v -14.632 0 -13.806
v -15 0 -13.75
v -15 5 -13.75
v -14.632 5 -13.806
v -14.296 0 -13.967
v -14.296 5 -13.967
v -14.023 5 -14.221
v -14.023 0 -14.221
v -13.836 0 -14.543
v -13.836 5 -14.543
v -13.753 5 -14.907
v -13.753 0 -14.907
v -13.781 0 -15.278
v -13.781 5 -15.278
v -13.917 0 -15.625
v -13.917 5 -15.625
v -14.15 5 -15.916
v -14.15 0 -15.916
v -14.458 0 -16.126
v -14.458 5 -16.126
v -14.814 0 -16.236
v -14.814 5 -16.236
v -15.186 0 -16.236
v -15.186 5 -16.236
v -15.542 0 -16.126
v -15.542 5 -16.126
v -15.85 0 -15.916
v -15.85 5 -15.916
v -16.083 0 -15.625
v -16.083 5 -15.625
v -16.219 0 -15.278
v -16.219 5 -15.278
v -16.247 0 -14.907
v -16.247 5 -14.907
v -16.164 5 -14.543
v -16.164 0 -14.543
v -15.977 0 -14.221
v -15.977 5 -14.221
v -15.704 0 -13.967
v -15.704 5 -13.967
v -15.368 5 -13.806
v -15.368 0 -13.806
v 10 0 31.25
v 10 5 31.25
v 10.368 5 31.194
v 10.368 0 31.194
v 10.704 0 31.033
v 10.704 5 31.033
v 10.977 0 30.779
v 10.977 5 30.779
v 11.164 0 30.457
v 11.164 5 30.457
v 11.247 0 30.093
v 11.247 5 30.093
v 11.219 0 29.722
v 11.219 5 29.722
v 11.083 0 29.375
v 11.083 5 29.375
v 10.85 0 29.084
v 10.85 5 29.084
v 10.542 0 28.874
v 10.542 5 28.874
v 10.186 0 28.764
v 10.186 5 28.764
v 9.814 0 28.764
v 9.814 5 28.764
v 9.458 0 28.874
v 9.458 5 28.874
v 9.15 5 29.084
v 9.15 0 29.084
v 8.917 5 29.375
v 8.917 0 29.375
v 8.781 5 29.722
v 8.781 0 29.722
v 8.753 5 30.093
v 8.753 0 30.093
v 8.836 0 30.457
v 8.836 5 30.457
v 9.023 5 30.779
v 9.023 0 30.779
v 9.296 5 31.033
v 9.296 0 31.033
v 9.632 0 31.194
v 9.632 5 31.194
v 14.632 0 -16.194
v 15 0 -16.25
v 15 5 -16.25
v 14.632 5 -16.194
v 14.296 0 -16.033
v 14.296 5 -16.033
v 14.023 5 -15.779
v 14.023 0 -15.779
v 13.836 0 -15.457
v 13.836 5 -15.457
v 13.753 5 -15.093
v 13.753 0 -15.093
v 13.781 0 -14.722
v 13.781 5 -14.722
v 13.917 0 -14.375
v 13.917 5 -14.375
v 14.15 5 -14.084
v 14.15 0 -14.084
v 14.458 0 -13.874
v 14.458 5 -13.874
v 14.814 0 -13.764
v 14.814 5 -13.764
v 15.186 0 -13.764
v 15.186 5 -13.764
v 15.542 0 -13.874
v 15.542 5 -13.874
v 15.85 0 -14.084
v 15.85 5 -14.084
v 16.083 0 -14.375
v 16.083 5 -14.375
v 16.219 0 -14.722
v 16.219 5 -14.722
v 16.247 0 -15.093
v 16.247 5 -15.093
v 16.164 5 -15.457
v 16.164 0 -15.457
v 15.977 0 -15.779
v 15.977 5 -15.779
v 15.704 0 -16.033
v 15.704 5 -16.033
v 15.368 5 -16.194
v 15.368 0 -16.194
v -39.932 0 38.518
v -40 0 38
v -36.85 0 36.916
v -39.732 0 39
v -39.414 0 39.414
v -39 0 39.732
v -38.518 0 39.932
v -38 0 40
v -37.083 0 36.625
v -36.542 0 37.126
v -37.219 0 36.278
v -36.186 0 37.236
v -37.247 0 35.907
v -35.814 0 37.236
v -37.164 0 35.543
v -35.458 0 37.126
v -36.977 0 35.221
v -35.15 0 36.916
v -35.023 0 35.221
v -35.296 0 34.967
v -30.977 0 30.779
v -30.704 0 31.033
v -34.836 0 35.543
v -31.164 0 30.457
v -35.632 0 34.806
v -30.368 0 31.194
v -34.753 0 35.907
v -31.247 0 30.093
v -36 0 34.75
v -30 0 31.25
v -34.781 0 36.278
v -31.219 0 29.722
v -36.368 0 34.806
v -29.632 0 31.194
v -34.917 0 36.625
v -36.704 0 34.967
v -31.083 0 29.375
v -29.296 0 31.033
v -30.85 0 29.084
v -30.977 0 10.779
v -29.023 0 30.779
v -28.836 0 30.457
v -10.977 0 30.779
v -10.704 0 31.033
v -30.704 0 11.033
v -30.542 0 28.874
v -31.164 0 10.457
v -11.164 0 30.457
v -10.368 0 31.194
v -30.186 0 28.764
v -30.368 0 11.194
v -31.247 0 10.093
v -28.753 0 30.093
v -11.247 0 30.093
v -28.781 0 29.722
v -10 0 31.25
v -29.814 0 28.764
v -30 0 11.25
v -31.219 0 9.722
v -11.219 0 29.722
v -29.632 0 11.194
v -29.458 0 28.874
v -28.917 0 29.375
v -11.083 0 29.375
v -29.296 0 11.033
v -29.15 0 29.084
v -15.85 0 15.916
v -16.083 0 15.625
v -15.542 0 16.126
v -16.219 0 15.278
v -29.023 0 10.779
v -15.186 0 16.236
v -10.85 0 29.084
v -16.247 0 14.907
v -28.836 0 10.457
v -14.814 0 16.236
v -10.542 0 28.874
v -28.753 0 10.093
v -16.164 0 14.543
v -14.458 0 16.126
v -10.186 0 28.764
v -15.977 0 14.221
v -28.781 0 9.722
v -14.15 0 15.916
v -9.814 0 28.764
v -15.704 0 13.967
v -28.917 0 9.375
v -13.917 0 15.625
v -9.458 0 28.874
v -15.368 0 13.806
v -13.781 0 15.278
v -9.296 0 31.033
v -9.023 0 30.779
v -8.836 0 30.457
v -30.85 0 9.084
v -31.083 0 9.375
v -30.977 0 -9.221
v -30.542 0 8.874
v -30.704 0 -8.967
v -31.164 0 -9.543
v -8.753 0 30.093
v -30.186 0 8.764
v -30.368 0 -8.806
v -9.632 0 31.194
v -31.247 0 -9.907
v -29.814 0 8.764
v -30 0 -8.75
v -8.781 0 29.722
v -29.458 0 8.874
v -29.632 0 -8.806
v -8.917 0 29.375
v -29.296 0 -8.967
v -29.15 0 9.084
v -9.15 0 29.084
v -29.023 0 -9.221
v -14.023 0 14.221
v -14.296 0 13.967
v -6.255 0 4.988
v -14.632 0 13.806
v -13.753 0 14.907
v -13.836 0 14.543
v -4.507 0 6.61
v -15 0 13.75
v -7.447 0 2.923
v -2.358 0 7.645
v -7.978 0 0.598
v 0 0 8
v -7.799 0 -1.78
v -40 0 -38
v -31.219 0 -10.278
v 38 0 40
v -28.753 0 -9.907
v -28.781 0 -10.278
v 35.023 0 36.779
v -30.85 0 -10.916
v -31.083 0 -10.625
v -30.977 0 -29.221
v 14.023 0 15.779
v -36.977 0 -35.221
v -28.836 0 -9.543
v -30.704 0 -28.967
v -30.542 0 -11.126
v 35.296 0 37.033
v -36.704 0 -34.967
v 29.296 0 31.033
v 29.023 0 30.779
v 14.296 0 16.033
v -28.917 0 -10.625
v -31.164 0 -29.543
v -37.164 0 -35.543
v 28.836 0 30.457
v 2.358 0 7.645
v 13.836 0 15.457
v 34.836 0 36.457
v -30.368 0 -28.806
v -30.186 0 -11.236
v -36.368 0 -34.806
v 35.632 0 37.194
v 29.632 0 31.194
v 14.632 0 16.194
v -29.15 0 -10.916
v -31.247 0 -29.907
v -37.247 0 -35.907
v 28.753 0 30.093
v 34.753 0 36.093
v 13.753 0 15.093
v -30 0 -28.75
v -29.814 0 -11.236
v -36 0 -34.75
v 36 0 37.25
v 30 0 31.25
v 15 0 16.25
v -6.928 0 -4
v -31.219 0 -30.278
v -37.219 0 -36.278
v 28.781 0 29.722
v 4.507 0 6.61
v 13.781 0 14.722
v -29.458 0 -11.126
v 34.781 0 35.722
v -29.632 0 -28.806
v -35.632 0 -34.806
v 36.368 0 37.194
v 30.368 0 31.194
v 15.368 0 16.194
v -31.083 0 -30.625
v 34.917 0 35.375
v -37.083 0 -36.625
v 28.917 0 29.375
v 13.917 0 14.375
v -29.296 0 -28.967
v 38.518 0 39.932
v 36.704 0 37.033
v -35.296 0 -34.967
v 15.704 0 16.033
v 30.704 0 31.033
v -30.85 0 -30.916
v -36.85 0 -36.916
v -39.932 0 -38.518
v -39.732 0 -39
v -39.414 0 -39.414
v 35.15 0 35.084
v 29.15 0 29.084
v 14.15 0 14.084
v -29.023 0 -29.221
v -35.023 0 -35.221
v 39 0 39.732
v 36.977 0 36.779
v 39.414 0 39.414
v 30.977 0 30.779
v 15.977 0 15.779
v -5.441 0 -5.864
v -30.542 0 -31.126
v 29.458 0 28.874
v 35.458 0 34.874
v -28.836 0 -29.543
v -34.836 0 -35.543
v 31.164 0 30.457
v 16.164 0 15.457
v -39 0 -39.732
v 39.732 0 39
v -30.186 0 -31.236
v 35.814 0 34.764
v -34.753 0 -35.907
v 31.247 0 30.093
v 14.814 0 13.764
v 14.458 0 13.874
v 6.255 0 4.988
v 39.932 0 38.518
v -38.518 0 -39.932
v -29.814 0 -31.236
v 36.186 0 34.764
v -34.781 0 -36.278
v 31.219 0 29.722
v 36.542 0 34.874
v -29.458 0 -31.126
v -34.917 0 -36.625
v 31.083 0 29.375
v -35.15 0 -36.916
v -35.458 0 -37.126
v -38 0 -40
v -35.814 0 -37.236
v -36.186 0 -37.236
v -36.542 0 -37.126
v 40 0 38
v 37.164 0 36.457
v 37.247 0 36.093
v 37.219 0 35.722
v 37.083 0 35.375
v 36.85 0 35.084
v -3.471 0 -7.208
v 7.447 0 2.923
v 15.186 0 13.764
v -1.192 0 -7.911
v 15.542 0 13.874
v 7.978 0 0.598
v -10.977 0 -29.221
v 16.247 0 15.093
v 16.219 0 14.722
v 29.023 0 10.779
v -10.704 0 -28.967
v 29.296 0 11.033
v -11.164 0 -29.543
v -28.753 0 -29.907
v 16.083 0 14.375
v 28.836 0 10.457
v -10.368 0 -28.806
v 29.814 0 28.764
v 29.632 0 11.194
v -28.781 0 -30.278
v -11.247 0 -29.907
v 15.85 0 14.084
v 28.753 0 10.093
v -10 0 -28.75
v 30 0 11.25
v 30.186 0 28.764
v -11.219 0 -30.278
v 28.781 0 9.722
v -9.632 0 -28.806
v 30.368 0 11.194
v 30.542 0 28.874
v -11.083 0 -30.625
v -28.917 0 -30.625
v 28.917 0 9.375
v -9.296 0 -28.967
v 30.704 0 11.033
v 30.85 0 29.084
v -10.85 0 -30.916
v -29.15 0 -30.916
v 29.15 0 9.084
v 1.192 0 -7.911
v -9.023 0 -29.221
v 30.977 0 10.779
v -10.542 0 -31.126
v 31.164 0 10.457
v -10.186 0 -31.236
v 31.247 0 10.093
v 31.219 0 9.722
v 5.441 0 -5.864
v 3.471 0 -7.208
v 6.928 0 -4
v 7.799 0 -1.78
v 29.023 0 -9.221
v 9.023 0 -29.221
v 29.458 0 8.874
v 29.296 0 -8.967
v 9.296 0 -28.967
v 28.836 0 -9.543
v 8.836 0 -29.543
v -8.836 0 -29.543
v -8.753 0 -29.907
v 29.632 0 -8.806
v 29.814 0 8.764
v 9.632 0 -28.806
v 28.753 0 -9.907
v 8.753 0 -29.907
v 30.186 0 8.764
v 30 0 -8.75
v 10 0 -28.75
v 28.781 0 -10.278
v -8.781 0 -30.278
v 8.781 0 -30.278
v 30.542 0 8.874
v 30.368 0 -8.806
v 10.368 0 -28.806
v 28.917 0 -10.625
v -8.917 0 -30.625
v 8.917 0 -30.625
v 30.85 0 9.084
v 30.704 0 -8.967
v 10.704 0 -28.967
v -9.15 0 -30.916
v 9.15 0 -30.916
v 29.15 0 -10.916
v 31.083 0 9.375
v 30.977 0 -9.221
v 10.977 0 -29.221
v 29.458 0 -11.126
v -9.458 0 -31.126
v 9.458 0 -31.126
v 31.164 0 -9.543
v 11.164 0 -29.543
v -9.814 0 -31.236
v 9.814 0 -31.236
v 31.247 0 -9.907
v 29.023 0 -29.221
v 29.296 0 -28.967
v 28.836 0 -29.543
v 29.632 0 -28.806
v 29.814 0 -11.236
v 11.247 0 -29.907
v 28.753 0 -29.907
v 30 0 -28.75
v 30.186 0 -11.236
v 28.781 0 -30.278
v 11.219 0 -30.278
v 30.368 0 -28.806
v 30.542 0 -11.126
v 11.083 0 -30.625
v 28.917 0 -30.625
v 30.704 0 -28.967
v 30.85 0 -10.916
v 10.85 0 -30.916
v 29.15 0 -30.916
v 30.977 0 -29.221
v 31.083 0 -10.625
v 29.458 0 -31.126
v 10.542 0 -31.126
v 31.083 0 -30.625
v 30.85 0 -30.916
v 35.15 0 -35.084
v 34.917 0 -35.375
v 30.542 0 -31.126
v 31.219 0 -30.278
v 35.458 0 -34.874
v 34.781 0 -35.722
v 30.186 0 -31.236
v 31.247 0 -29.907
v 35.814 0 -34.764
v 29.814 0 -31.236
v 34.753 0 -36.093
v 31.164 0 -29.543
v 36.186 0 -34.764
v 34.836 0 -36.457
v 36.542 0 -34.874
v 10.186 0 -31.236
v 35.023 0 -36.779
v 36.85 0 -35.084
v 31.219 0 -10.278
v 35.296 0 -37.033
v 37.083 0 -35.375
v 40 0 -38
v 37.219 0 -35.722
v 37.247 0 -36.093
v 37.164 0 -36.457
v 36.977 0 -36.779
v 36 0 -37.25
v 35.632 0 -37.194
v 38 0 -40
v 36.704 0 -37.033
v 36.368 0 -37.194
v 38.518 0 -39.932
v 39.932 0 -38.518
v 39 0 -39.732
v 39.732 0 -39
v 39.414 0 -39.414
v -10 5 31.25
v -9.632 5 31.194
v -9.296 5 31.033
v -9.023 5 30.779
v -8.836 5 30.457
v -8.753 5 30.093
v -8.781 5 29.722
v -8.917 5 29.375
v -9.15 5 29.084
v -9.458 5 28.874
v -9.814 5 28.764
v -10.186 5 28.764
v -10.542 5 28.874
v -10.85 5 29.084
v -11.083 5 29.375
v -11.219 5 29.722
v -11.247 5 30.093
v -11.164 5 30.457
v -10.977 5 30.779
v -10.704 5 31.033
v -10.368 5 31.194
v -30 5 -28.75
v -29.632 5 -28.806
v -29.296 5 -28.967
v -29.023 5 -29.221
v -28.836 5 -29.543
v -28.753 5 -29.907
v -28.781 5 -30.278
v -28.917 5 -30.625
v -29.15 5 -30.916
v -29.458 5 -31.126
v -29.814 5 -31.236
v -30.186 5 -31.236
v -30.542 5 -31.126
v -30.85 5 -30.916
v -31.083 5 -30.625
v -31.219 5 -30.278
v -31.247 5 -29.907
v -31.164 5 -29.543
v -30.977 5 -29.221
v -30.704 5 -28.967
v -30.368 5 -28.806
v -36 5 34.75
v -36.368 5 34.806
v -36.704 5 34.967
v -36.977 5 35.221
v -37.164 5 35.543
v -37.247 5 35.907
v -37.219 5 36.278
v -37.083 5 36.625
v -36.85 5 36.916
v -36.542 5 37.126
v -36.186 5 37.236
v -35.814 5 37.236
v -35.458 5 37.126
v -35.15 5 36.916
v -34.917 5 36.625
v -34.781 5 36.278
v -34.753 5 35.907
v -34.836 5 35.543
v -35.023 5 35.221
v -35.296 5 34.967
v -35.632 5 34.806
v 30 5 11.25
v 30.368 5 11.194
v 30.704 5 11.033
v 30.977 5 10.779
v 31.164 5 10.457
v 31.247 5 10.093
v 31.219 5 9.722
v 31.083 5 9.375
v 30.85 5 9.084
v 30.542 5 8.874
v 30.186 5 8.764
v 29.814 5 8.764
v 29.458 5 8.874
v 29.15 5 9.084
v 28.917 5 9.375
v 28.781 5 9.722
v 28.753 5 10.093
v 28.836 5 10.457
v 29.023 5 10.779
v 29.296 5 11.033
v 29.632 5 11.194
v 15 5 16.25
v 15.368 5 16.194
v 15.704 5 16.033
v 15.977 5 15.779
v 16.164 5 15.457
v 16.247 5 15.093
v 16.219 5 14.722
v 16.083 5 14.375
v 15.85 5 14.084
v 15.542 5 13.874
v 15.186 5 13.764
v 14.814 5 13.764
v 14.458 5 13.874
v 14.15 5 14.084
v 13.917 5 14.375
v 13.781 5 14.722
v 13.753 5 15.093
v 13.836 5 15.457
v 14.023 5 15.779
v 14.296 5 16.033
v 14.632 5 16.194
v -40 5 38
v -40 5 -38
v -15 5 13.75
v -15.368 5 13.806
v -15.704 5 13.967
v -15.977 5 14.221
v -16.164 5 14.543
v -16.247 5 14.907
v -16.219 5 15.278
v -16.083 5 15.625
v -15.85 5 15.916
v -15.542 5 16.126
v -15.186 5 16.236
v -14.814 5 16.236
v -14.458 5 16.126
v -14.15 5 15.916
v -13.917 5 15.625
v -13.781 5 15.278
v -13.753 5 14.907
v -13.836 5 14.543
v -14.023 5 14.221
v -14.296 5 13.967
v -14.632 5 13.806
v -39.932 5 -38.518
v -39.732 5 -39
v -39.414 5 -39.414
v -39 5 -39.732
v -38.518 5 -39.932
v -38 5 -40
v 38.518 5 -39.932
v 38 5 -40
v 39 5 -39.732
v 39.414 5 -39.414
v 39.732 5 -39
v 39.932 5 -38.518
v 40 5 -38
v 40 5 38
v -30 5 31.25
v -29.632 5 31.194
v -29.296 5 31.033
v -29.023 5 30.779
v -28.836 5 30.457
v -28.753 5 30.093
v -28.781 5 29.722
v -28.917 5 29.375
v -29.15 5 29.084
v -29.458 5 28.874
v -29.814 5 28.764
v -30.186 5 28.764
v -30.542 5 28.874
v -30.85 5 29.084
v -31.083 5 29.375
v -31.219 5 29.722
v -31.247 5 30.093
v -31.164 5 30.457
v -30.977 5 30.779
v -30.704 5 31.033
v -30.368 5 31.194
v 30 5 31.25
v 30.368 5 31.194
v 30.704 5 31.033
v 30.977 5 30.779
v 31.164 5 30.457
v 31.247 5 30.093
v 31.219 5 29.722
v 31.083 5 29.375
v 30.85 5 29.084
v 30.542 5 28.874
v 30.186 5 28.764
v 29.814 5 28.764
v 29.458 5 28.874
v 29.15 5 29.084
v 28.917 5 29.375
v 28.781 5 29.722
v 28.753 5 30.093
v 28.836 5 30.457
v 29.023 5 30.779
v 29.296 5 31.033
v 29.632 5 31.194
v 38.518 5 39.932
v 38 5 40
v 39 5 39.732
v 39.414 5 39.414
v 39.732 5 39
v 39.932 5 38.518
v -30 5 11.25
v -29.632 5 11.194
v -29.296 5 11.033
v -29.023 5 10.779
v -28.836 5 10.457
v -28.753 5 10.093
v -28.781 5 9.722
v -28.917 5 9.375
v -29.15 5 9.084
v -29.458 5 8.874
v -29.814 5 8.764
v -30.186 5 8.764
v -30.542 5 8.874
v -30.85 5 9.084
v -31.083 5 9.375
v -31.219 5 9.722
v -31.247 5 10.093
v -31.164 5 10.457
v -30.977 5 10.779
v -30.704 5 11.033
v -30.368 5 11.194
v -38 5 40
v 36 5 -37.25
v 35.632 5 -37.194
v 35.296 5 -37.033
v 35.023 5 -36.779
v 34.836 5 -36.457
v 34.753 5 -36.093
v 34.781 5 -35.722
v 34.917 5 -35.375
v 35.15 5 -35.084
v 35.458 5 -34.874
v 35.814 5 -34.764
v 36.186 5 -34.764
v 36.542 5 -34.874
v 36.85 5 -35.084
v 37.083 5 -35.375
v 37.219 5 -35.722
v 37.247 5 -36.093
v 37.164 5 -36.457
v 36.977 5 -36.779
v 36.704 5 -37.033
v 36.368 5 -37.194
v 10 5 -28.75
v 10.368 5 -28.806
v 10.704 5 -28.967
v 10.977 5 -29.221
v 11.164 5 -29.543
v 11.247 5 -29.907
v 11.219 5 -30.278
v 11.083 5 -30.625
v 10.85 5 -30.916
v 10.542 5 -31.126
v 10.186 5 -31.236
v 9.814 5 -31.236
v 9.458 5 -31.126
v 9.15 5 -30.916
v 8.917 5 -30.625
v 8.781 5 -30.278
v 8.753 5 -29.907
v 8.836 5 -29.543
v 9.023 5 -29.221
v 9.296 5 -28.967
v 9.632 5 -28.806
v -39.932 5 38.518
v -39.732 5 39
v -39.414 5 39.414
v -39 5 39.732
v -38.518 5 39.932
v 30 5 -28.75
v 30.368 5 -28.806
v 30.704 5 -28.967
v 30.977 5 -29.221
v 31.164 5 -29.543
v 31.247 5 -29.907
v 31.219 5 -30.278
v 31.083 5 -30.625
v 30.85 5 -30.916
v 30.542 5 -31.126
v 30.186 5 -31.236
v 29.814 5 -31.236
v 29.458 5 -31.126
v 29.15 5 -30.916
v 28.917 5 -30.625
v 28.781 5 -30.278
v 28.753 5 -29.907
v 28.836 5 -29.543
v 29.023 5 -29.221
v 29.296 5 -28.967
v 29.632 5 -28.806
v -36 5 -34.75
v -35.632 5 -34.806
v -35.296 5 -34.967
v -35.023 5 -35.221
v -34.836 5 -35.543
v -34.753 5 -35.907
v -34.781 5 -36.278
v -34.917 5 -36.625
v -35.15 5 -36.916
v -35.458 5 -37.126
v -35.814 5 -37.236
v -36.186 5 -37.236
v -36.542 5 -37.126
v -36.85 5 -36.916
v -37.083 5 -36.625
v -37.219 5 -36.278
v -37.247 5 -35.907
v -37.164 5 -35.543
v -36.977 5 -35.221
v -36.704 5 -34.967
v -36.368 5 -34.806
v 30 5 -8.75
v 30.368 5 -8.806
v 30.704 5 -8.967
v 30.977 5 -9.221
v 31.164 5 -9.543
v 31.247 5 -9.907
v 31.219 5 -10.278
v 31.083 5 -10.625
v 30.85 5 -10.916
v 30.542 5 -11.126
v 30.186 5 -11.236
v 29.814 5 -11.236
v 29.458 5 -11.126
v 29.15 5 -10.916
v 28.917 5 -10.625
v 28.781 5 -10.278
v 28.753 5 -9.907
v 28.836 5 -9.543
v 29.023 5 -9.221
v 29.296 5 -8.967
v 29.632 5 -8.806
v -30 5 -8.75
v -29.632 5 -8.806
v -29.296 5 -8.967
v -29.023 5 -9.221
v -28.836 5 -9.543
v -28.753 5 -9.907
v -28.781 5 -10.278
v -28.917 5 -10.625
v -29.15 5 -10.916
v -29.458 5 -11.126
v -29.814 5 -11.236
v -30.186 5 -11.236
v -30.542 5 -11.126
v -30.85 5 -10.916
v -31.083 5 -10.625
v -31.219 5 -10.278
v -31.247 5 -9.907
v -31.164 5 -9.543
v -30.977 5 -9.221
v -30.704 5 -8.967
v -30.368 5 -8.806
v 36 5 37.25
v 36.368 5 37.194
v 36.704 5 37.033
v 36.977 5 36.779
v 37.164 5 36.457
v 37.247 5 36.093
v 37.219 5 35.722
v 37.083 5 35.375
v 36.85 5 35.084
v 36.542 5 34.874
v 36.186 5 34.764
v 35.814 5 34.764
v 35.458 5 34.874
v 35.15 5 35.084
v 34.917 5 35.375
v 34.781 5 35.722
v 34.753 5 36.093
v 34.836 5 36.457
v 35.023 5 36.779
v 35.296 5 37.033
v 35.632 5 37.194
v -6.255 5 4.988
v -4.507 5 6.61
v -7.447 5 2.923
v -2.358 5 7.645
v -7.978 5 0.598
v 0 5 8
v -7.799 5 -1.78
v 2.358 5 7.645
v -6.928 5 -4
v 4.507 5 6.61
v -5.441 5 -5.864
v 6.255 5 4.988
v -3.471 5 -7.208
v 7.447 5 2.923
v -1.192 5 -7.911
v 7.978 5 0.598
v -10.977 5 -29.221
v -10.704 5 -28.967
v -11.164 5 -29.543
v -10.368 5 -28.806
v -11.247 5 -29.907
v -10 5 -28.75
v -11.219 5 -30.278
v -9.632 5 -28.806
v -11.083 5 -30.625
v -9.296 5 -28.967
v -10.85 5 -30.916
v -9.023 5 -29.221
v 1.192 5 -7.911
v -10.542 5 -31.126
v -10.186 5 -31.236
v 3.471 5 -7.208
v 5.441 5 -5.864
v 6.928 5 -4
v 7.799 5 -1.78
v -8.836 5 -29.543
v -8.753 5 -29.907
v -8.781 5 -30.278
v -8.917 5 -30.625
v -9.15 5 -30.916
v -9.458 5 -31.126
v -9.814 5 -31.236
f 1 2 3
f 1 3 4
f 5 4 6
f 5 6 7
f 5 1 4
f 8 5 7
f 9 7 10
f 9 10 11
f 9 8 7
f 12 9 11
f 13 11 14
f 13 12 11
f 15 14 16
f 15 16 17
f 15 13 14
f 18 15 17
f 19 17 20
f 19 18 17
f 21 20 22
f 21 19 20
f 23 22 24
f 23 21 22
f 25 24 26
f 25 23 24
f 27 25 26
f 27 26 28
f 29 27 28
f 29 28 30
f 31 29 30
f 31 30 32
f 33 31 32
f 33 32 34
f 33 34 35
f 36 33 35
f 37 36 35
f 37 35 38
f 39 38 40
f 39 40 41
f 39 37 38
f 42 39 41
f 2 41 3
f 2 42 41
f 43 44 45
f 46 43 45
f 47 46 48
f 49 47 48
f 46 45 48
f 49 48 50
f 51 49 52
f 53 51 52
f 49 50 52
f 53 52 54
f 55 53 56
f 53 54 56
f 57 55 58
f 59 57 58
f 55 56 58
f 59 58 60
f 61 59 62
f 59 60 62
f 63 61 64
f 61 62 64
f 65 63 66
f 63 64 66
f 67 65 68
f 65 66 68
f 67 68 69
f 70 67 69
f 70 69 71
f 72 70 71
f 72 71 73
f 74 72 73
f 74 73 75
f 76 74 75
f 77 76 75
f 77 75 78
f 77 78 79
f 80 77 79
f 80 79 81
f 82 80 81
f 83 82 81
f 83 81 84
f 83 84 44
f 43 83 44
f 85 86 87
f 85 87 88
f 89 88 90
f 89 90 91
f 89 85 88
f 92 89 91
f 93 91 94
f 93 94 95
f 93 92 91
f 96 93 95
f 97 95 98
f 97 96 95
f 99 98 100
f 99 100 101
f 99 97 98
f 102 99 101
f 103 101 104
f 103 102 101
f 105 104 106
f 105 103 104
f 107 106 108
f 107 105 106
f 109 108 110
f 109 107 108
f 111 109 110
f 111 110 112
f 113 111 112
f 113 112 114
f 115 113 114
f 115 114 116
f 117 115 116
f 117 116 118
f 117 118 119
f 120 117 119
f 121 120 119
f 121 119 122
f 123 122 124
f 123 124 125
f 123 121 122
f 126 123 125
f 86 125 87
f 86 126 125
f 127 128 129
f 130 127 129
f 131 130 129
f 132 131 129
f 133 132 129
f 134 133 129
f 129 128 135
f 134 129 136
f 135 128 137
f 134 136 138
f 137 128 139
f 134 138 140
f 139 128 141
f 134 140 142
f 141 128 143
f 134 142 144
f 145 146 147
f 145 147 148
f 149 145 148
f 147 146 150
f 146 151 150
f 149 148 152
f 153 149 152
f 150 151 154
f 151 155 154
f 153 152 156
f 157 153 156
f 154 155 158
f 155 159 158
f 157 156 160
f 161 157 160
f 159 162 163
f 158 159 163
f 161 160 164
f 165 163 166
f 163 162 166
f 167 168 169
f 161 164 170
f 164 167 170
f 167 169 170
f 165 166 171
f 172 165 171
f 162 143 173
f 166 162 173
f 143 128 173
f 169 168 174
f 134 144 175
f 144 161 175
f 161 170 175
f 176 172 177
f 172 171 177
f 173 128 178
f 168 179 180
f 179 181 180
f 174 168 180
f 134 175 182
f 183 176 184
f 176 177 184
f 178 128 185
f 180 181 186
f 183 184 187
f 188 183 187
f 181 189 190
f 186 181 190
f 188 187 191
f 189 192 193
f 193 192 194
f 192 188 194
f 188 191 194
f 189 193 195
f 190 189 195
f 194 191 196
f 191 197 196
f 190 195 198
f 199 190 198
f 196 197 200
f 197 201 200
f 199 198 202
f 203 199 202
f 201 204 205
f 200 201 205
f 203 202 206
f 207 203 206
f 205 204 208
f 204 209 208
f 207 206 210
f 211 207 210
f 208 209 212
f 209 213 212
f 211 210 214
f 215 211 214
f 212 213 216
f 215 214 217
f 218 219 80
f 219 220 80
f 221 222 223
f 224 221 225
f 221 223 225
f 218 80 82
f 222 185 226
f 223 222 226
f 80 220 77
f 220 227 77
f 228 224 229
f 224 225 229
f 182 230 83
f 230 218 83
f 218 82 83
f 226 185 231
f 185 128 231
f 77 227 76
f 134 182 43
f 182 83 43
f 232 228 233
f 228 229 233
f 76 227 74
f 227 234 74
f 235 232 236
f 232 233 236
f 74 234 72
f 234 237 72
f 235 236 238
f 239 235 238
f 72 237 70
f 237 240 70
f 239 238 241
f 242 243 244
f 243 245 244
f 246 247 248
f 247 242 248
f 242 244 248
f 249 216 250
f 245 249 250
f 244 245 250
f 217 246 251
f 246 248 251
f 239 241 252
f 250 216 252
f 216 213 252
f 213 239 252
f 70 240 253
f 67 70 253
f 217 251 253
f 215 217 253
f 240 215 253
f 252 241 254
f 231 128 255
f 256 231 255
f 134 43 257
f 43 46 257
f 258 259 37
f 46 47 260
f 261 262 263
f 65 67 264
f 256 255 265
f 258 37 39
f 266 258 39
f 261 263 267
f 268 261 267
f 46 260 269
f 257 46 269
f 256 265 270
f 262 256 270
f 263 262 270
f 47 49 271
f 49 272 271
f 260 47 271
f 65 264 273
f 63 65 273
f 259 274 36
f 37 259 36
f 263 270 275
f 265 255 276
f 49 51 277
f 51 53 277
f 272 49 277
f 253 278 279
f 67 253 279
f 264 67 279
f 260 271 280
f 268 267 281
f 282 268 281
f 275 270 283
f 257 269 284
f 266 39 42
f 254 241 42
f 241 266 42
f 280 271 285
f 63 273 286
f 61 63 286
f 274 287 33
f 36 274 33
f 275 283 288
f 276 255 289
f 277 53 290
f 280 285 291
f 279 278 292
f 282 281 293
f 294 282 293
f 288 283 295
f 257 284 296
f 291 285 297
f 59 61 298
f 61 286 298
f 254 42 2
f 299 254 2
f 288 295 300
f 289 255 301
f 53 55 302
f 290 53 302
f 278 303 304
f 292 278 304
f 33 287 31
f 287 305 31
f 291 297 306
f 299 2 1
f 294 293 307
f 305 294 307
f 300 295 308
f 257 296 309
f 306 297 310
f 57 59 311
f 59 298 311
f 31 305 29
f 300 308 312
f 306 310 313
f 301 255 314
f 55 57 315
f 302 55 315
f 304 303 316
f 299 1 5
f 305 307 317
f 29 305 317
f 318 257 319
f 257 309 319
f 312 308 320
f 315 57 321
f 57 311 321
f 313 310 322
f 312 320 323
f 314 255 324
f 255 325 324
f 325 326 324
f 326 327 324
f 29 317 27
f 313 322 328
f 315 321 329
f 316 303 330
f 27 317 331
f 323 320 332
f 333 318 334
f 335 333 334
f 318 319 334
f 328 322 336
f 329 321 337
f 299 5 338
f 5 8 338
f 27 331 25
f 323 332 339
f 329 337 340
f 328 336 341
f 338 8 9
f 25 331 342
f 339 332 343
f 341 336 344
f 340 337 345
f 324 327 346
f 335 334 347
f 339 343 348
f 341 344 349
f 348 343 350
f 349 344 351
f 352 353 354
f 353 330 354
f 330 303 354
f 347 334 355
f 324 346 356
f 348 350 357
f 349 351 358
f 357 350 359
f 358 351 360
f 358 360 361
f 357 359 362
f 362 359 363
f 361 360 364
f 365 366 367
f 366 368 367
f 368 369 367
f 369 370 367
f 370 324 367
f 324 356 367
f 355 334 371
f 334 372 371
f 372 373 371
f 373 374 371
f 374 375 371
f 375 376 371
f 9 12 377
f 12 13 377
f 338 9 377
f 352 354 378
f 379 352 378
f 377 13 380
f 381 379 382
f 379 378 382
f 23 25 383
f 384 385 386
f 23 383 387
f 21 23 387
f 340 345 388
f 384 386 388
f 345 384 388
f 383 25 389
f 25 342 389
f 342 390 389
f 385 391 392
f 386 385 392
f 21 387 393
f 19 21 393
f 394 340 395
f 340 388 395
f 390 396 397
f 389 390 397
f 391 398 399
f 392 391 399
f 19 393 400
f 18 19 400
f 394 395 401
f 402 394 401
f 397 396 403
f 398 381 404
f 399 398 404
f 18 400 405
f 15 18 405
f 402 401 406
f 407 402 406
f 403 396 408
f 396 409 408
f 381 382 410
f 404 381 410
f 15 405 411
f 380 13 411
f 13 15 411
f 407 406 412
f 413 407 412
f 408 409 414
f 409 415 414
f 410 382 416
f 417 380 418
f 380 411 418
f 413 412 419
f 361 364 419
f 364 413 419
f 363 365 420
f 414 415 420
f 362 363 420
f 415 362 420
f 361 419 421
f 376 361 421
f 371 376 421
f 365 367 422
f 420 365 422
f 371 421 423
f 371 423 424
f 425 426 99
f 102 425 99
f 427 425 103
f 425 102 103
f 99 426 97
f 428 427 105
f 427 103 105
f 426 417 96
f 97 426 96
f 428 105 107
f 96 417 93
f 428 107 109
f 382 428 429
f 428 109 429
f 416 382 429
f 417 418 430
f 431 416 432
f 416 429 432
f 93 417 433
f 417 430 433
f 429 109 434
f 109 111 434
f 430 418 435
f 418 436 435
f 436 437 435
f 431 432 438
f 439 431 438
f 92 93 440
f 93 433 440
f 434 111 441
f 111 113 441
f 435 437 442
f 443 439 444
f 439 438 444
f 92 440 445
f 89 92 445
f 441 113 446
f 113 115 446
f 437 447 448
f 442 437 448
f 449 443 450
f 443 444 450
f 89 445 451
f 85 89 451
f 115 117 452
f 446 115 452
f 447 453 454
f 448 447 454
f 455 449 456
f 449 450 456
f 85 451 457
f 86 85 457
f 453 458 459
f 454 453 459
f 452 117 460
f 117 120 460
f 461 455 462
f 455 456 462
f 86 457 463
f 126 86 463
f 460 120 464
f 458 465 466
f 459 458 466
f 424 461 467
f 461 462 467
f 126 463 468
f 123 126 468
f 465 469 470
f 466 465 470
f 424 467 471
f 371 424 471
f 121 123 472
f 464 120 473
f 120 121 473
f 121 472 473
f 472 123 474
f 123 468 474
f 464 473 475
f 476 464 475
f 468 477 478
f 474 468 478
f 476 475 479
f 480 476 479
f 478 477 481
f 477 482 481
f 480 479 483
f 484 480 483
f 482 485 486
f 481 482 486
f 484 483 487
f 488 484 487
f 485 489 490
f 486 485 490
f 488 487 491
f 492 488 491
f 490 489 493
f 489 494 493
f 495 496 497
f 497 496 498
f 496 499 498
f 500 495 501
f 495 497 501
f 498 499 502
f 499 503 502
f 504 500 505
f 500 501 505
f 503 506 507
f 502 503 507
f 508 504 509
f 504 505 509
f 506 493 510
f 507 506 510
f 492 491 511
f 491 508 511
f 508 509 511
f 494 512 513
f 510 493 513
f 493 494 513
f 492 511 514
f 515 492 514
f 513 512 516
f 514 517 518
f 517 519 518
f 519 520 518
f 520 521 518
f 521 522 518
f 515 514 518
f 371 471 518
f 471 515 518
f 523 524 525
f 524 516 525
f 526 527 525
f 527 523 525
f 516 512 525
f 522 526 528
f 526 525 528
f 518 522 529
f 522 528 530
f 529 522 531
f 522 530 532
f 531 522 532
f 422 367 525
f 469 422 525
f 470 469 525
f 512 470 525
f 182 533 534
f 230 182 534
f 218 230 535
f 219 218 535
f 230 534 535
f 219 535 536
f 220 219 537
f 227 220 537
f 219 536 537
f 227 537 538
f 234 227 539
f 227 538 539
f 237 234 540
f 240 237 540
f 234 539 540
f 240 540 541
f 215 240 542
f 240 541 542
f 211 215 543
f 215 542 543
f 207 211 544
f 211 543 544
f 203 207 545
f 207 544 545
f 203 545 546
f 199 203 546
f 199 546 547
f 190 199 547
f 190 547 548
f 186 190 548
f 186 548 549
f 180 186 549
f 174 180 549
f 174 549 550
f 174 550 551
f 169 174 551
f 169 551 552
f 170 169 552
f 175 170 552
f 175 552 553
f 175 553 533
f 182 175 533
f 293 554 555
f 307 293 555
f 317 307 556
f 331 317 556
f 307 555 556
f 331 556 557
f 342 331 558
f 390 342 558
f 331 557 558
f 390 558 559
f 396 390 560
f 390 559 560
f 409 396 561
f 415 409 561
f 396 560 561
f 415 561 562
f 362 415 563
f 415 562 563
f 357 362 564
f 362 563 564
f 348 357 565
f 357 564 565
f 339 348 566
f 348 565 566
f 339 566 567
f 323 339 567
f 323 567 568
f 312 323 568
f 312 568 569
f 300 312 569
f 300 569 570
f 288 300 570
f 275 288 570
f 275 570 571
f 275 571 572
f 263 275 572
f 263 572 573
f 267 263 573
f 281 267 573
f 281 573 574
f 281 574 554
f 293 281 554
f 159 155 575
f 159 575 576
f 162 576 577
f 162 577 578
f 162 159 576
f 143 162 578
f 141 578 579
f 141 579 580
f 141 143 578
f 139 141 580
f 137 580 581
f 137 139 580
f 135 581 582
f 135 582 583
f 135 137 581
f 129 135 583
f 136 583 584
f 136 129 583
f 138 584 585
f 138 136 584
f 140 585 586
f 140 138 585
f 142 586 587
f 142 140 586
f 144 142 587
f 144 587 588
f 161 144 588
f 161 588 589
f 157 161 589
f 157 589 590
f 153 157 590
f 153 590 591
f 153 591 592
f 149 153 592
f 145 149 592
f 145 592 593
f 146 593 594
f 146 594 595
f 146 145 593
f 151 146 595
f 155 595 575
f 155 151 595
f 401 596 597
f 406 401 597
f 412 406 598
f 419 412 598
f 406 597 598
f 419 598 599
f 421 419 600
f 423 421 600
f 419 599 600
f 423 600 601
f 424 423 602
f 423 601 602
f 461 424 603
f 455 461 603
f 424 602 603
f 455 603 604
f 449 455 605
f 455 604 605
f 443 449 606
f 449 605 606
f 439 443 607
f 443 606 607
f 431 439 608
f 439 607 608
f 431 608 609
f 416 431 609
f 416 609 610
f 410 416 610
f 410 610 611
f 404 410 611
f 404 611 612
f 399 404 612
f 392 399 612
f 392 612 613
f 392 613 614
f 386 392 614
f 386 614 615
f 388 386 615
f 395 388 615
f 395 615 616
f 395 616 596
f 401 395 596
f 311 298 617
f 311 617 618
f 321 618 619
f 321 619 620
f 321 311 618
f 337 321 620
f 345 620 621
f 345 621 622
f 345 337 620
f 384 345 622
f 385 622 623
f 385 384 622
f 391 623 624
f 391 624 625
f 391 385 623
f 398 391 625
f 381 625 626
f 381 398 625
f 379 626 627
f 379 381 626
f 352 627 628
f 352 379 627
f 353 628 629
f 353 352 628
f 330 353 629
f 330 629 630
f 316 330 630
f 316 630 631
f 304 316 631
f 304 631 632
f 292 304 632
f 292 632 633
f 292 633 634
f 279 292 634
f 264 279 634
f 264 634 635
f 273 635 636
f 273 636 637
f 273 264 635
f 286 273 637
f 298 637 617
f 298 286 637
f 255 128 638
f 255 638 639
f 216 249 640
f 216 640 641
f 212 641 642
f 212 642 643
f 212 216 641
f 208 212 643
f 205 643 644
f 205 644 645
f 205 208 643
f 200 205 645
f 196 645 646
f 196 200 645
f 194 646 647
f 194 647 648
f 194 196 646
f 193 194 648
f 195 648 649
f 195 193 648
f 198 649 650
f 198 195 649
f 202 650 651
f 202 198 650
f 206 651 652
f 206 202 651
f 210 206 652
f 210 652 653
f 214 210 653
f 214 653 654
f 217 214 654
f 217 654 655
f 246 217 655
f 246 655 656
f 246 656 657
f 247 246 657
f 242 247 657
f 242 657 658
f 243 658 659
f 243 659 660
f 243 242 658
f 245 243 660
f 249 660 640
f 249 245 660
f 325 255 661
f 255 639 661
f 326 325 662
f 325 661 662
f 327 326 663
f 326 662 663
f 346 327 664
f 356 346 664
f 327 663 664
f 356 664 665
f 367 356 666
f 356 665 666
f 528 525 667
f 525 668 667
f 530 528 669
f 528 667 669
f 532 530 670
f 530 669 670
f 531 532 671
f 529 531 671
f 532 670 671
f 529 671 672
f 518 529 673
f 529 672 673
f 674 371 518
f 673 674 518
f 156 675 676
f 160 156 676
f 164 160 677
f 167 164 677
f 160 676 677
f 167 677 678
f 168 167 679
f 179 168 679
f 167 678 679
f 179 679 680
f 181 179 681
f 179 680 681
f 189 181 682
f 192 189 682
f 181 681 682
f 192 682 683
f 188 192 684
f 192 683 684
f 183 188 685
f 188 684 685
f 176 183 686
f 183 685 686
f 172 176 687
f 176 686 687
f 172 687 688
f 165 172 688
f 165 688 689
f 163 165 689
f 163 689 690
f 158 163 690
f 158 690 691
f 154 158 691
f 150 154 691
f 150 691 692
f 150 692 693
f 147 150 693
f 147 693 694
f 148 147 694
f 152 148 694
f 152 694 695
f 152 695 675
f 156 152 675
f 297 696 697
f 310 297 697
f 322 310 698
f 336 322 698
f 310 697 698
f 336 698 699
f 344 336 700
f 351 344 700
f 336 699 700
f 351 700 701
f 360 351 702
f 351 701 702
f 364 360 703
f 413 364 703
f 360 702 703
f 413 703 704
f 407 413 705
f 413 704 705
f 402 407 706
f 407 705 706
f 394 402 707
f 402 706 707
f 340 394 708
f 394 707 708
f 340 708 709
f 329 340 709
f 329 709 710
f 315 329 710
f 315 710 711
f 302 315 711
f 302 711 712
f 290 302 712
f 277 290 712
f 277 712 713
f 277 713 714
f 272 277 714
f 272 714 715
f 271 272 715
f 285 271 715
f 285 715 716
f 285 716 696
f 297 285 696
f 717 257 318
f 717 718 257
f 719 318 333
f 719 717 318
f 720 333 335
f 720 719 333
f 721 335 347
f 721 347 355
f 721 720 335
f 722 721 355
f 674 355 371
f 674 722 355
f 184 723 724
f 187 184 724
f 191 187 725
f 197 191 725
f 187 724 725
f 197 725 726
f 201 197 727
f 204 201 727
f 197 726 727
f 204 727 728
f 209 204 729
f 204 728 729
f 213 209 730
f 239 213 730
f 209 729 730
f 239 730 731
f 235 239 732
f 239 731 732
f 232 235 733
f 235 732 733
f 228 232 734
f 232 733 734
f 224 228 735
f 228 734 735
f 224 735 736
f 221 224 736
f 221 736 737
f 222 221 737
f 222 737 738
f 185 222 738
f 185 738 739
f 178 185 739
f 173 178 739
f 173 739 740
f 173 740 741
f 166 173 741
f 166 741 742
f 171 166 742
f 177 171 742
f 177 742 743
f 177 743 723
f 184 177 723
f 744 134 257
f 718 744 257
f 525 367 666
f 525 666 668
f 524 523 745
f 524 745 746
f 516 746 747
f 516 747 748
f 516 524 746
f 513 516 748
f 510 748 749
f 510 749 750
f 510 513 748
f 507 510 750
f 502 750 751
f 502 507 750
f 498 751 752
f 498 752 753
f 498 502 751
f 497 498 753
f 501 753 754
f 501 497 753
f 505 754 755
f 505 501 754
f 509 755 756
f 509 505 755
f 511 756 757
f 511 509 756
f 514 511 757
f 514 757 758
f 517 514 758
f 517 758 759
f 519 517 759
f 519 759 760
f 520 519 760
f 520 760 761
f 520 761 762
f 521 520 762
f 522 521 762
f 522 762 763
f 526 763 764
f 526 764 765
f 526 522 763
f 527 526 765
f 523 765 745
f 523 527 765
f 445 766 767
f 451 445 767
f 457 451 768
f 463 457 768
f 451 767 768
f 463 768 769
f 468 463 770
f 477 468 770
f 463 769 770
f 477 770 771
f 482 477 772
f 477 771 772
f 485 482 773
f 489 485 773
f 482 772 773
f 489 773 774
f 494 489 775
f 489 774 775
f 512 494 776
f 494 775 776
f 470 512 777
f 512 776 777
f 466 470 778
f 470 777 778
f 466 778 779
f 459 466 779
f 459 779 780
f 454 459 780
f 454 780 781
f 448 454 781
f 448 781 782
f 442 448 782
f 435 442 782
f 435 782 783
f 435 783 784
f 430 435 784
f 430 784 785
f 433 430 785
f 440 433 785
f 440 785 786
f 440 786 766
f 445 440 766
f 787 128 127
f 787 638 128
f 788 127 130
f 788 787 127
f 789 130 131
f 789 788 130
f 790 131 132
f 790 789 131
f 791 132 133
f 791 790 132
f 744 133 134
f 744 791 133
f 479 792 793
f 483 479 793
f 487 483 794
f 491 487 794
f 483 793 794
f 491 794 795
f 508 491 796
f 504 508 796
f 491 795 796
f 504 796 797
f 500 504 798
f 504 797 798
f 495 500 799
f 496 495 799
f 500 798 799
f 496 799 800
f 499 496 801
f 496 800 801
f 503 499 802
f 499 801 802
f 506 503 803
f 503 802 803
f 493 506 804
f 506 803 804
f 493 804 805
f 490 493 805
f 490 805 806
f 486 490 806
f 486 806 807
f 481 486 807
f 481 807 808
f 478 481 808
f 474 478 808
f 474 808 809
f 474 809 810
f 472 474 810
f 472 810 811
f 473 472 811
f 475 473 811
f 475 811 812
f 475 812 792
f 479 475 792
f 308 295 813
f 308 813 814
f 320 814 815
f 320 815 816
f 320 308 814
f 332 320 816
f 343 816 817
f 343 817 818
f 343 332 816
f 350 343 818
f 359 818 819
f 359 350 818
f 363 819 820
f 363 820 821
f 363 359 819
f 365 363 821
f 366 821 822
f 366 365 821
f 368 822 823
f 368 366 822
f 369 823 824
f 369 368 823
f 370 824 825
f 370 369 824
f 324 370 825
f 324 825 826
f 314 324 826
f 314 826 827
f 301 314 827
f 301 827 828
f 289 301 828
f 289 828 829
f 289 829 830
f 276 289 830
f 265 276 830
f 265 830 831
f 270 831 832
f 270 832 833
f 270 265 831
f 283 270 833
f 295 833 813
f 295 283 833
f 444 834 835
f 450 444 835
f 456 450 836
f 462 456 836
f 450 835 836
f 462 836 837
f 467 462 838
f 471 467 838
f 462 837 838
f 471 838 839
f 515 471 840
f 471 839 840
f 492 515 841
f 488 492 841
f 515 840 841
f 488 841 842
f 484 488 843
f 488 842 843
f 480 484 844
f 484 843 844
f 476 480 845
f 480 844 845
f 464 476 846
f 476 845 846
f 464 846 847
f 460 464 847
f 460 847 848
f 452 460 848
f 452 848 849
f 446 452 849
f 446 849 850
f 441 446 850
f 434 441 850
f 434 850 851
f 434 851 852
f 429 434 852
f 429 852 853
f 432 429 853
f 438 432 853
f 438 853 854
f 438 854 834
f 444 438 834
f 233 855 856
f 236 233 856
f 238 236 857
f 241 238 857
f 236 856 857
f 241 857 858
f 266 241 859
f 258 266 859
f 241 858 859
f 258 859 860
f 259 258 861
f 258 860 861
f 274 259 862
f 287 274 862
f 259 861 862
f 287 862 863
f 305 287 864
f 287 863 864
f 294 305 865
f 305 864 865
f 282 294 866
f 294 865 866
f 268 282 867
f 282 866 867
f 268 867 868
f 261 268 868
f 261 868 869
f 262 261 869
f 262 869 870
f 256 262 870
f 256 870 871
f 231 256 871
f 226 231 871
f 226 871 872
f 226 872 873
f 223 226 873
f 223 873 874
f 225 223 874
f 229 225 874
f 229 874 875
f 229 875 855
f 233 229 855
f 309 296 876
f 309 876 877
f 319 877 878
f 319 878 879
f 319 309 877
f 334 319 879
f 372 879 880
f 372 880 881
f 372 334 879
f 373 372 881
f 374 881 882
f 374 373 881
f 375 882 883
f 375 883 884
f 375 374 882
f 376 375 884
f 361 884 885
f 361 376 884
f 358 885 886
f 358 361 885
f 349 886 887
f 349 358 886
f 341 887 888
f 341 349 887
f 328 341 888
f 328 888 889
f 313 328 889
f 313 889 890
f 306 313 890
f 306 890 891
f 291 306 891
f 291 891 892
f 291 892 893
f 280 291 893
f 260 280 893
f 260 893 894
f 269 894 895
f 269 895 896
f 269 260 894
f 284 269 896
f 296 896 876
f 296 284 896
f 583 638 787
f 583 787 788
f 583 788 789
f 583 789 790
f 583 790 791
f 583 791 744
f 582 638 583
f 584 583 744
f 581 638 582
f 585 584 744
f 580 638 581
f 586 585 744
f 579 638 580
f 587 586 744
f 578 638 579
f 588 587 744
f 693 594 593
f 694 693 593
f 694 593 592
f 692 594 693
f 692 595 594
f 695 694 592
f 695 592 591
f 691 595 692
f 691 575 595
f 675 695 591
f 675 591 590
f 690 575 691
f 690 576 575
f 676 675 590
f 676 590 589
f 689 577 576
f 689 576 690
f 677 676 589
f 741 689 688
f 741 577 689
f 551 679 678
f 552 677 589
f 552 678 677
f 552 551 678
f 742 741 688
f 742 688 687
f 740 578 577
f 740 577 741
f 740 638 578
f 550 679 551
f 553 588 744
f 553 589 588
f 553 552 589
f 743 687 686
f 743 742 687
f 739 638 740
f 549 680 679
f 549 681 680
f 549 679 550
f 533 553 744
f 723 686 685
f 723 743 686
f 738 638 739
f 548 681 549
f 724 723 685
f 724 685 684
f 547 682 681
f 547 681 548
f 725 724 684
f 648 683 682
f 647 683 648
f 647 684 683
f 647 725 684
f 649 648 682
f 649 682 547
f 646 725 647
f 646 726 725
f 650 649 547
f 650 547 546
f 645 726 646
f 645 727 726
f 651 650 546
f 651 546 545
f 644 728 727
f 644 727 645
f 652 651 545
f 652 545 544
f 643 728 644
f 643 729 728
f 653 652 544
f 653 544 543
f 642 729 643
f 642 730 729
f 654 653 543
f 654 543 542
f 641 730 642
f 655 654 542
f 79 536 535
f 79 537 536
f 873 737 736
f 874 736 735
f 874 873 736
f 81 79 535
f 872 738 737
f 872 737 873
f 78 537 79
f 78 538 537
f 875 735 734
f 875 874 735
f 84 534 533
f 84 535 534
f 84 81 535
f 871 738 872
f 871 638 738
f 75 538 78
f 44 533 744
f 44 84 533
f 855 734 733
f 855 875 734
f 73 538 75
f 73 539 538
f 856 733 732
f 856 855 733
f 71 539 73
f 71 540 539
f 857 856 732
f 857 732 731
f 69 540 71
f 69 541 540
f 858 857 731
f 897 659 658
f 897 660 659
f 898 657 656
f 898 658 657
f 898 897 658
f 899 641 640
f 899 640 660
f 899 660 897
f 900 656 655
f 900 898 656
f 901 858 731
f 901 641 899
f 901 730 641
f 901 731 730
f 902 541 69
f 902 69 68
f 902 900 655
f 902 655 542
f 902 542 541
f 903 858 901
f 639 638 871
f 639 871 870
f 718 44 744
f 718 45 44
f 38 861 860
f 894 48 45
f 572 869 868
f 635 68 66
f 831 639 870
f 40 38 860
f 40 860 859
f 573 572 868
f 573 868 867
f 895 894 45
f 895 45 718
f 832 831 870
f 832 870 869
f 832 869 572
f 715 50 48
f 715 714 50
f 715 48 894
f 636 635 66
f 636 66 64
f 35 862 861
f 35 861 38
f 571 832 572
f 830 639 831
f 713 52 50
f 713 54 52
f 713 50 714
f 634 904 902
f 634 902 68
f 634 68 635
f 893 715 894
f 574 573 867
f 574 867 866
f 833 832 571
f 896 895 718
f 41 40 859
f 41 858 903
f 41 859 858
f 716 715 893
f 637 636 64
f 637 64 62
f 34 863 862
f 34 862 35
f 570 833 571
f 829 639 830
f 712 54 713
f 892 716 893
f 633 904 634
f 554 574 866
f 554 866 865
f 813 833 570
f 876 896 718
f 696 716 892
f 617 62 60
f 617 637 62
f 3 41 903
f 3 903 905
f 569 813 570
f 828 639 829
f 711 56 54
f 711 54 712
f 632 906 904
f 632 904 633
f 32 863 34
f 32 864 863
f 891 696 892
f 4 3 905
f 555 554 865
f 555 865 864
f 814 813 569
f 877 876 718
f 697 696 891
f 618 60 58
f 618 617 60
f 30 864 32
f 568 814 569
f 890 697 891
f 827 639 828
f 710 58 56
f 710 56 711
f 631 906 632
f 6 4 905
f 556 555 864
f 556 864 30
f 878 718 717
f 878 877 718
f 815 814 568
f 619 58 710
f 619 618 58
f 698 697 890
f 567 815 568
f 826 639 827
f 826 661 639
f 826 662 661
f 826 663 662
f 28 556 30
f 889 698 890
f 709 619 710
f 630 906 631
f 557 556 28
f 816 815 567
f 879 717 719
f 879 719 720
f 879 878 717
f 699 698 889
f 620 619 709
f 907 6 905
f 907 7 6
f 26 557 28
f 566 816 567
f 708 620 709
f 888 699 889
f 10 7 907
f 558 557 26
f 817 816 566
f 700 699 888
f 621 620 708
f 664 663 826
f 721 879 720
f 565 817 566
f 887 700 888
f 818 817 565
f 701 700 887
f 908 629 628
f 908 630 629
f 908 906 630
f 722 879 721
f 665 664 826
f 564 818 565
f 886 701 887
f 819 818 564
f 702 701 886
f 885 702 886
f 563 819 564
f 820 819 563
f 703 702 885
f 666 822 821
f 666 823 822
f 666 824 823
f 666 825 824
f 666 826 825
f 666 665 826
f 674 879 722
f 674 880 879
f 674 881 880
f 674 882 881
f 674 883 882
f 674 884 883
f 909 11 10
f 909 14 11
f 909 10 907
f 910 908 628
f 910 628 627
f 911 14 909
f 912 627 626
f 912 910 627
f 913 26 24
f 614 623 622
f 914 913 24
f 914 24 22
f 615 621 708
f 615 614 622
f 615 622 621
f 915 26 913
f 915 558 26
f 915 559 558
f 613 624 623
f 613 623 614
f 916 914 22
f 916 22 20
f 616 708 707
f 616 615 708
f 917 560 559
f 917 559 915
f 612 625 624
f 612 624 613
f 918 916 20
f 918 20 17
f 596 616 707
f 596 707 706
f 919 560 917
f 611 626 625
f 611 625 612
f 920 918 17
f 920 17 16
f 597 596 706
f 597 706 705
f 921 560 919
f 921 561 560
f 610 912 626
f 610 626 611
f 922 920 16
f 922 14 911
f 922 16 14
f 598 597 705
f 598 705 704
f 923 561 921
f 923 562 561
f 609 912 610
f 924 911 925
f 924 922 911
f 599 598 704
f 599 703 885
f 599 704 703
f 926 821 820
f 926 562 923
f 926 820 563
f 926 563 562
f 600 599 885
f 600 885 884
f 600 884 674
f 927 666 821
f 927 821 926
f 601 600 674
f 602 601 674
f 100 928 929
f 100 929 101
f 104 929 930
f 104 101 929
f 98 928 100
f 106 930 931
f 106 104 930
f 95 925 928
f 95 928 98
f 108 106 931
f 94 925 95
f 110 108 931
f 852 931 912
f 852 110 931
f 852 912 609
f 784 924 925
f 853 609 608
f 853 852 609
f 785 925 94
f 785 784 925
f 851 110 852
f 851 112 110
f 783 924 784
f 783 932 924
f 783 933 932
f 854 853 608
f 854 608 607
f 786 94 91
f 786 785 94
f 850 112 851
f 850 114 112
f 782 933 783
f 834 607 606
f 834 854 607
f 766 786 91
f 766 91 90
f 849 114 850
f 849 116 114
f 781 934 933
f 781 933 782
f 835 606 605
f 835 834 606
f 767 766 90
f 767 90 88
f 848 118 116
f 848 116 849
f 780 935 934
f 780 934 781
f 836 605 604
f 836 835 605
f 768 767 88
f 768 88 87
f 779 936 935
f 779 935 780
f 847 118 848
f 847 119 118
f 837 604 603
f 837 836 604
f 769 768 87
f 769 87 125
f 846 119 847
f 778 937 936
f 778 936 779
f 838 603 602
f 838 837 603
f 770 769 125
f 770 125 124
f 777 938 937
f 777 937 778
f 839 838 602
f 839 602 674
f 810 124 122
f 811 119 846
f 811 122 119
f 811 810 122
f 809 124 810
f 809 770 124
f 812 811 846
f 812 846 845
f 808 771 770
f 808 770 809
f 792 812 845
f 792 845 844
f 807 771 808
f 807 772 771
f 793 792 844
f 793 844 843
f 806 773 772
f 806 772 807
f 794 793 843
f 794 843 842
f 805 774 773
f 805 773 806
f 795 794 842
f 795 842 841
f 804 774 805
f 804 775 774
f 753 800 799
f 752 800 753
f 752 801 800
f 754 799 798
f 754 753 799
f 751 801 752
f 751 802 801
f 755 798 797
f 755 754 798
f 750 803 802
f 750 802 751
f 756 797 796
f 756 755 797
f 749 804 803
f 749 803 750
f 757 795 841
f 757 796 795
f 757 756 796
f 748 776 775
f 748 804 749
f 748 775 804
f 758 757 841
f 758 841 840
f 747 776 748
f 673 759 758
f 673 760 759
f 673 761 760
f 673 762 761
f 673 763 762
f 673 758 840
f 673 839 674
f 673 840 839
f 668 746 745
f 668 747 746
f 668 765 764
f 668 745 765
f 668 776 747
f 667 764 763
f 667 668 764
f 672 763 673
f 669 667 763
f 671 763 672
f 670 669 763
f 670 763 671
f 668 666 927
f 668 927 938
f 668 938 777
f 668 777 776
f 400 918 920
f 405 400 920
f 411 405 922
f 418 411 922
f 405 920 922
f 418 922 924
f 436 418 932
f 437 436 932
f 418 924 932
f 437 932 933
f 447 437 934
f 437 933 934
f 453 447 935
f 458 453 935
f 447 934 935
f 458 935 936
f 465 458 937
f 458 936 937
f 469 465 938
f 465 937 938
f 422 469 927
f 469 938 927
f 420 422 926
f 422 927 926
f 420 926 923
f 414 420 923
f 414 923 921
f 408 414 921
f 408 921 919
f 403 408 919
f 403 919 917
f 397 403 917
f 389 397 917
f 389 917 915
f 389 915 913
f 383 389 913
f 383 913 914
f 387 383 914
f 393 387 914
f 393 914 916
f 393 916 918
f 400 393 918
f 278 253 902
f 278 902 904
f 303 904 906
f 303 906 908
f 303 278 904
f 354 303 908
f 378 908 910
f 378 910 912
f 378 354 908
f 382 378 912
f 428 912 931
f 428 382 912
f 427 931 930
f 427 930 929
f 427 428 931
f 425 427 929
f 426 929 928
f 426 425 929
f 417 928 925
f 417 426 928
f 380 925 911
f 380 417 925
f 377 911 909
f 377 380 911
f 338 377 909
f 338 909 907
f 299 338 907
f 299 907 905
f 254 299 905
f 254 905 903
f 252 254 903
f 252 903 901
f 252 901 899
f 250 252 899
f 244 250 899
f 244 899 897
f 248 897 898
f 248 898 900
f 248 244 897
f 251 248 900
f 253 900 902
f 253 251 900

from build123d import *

# Parameters (mm, degrees)
ESQUISSE1_W                     = 80
ESQUISSE1_H                     = 80
ESQUISSE1_R                     = 1.25
ESQUISSE1_R_2                   = 8
EXTRUSION1_DEPTH                = 5
ESQUISSE2_R                     = 1.25
ENL_V_MAT_EXTRU_1_DEPTH         = 57.789083458
R_P_TITION_LIN_AIRE1_COUNT      = 4
R_P_TITION_LIN_AIRE1_PITCH      = 20
R_P_TITION_LIN_AIRE1_COUNT_DIR2 = 4
R_P_TITION_LIN_AIRE1_PITCH_DIR2 = 20
CONG_1_R                        = 2


with BuildPart() as part:
    # Esquisse1 → Extrusion1 (new body)
    with BuildSketch(Plane(origin=(0, 0, 0), x_dir=(1, 0, 0), z_dir=(0, 1, 0))):
        Rectangle(ESQUISSE1_W, ESQUISSE1_H)
        with Locations(Location((-15, 15, 0), (0, 0, 270))):
            Circle(ESQUISSE1_R, mode=Mode.SUBTRACT)
        with Locations(Location((15, 15, 0), (0, 0, 90))):
            Circle(ESQUISSE1_R, mode=Mode.SUBTRACT)
        with Locations(Location((-15, -15, 0), (0, 0, 90))):
            Circle(ESQUISSE1_R, mode=Mode.SUBTRACT)
        with Locations(Location((15, -15, 0), (0, 0, 270))):
            Circle(ESQUISSE1_R, mode=Mode.SUBTRACT)
        with Locations(Location((-36, 36, 0), (0, 0, 270))):
            Circle(ESQUISSE1_R, mode=Mode.SUBTRACT)
        with Locations(Location((36, 36, 0), (0, 0, 90))):
            Circle(ESQUISSE1_R, mode=Mode.SUBTRACT)
        with Locations(Location((36, -36, 0), (0, 0, 270))):
            Circle(ESQUISSE1_R, mode=Mode.SUBTRACT)
        with Locations(Location((-36, -36, 0), (0, 0, 90))):
            Circle(ESQUISSE1_R, mode=Mode.SUBTRACT)
        with Locations(Location((0, 0, 0), (0, 0, 270))):
            Circle(ESQUISSE1_R_2, mode=Mode.SUBTRACT)
    extrude(amount=EXTRUSION1_DEPTH)

    # Esquisse2 → Enlèv. mat.-Extru.1 (cut, through all)
    with BuildSketch(Plane(origin=(0, 5, 0), x_dir=(1, 0, 0), z_dir=(0, 1, 0))):
        with Locations(Location((-30, 30, 0), (0, 0, 270))):
            Circle(ESQUISSE2_R)
    enl_v_mat_extru_1 = extrude(amount=-ENL_V_MAT_EXTRU_1_DEPTH, mode=Mode.SUBTRACT)

    # Répétition linéaire1: Enl_v. mat.-Extru.1 4 × 4, 4 skipped
    with Locations(*[(j * R_P_TITION_LIN_AIRE1_PITCH_DIR2, 0, i * R_P_TITION_LIN_AIRE1_PITCH) for i in range(R_P_TITION_LIN_AIRE1_COUNT) for j in range(R_P_TITION_LIN_AIRE1_COUNT_DIR2) if (i, j) not in ((0, 0), (1, 1), (1, 2), (2, 1), (2, 2))]):
        add(enl_v_mat_extru_1, mode=Mode.SUBTRACT)

    # Congé1
    cong_1_edges = [part.edges().sort_by_distance(p)[0] for p in [
        (-40, 2.5, -40),
        (40, 2.5, -40),
        (40, 2.5, 40),
        (-40, 2.5, 40),
    ]]
    fillet(cong_1_edges, radius=CONG_1_R)


solid = part.part
